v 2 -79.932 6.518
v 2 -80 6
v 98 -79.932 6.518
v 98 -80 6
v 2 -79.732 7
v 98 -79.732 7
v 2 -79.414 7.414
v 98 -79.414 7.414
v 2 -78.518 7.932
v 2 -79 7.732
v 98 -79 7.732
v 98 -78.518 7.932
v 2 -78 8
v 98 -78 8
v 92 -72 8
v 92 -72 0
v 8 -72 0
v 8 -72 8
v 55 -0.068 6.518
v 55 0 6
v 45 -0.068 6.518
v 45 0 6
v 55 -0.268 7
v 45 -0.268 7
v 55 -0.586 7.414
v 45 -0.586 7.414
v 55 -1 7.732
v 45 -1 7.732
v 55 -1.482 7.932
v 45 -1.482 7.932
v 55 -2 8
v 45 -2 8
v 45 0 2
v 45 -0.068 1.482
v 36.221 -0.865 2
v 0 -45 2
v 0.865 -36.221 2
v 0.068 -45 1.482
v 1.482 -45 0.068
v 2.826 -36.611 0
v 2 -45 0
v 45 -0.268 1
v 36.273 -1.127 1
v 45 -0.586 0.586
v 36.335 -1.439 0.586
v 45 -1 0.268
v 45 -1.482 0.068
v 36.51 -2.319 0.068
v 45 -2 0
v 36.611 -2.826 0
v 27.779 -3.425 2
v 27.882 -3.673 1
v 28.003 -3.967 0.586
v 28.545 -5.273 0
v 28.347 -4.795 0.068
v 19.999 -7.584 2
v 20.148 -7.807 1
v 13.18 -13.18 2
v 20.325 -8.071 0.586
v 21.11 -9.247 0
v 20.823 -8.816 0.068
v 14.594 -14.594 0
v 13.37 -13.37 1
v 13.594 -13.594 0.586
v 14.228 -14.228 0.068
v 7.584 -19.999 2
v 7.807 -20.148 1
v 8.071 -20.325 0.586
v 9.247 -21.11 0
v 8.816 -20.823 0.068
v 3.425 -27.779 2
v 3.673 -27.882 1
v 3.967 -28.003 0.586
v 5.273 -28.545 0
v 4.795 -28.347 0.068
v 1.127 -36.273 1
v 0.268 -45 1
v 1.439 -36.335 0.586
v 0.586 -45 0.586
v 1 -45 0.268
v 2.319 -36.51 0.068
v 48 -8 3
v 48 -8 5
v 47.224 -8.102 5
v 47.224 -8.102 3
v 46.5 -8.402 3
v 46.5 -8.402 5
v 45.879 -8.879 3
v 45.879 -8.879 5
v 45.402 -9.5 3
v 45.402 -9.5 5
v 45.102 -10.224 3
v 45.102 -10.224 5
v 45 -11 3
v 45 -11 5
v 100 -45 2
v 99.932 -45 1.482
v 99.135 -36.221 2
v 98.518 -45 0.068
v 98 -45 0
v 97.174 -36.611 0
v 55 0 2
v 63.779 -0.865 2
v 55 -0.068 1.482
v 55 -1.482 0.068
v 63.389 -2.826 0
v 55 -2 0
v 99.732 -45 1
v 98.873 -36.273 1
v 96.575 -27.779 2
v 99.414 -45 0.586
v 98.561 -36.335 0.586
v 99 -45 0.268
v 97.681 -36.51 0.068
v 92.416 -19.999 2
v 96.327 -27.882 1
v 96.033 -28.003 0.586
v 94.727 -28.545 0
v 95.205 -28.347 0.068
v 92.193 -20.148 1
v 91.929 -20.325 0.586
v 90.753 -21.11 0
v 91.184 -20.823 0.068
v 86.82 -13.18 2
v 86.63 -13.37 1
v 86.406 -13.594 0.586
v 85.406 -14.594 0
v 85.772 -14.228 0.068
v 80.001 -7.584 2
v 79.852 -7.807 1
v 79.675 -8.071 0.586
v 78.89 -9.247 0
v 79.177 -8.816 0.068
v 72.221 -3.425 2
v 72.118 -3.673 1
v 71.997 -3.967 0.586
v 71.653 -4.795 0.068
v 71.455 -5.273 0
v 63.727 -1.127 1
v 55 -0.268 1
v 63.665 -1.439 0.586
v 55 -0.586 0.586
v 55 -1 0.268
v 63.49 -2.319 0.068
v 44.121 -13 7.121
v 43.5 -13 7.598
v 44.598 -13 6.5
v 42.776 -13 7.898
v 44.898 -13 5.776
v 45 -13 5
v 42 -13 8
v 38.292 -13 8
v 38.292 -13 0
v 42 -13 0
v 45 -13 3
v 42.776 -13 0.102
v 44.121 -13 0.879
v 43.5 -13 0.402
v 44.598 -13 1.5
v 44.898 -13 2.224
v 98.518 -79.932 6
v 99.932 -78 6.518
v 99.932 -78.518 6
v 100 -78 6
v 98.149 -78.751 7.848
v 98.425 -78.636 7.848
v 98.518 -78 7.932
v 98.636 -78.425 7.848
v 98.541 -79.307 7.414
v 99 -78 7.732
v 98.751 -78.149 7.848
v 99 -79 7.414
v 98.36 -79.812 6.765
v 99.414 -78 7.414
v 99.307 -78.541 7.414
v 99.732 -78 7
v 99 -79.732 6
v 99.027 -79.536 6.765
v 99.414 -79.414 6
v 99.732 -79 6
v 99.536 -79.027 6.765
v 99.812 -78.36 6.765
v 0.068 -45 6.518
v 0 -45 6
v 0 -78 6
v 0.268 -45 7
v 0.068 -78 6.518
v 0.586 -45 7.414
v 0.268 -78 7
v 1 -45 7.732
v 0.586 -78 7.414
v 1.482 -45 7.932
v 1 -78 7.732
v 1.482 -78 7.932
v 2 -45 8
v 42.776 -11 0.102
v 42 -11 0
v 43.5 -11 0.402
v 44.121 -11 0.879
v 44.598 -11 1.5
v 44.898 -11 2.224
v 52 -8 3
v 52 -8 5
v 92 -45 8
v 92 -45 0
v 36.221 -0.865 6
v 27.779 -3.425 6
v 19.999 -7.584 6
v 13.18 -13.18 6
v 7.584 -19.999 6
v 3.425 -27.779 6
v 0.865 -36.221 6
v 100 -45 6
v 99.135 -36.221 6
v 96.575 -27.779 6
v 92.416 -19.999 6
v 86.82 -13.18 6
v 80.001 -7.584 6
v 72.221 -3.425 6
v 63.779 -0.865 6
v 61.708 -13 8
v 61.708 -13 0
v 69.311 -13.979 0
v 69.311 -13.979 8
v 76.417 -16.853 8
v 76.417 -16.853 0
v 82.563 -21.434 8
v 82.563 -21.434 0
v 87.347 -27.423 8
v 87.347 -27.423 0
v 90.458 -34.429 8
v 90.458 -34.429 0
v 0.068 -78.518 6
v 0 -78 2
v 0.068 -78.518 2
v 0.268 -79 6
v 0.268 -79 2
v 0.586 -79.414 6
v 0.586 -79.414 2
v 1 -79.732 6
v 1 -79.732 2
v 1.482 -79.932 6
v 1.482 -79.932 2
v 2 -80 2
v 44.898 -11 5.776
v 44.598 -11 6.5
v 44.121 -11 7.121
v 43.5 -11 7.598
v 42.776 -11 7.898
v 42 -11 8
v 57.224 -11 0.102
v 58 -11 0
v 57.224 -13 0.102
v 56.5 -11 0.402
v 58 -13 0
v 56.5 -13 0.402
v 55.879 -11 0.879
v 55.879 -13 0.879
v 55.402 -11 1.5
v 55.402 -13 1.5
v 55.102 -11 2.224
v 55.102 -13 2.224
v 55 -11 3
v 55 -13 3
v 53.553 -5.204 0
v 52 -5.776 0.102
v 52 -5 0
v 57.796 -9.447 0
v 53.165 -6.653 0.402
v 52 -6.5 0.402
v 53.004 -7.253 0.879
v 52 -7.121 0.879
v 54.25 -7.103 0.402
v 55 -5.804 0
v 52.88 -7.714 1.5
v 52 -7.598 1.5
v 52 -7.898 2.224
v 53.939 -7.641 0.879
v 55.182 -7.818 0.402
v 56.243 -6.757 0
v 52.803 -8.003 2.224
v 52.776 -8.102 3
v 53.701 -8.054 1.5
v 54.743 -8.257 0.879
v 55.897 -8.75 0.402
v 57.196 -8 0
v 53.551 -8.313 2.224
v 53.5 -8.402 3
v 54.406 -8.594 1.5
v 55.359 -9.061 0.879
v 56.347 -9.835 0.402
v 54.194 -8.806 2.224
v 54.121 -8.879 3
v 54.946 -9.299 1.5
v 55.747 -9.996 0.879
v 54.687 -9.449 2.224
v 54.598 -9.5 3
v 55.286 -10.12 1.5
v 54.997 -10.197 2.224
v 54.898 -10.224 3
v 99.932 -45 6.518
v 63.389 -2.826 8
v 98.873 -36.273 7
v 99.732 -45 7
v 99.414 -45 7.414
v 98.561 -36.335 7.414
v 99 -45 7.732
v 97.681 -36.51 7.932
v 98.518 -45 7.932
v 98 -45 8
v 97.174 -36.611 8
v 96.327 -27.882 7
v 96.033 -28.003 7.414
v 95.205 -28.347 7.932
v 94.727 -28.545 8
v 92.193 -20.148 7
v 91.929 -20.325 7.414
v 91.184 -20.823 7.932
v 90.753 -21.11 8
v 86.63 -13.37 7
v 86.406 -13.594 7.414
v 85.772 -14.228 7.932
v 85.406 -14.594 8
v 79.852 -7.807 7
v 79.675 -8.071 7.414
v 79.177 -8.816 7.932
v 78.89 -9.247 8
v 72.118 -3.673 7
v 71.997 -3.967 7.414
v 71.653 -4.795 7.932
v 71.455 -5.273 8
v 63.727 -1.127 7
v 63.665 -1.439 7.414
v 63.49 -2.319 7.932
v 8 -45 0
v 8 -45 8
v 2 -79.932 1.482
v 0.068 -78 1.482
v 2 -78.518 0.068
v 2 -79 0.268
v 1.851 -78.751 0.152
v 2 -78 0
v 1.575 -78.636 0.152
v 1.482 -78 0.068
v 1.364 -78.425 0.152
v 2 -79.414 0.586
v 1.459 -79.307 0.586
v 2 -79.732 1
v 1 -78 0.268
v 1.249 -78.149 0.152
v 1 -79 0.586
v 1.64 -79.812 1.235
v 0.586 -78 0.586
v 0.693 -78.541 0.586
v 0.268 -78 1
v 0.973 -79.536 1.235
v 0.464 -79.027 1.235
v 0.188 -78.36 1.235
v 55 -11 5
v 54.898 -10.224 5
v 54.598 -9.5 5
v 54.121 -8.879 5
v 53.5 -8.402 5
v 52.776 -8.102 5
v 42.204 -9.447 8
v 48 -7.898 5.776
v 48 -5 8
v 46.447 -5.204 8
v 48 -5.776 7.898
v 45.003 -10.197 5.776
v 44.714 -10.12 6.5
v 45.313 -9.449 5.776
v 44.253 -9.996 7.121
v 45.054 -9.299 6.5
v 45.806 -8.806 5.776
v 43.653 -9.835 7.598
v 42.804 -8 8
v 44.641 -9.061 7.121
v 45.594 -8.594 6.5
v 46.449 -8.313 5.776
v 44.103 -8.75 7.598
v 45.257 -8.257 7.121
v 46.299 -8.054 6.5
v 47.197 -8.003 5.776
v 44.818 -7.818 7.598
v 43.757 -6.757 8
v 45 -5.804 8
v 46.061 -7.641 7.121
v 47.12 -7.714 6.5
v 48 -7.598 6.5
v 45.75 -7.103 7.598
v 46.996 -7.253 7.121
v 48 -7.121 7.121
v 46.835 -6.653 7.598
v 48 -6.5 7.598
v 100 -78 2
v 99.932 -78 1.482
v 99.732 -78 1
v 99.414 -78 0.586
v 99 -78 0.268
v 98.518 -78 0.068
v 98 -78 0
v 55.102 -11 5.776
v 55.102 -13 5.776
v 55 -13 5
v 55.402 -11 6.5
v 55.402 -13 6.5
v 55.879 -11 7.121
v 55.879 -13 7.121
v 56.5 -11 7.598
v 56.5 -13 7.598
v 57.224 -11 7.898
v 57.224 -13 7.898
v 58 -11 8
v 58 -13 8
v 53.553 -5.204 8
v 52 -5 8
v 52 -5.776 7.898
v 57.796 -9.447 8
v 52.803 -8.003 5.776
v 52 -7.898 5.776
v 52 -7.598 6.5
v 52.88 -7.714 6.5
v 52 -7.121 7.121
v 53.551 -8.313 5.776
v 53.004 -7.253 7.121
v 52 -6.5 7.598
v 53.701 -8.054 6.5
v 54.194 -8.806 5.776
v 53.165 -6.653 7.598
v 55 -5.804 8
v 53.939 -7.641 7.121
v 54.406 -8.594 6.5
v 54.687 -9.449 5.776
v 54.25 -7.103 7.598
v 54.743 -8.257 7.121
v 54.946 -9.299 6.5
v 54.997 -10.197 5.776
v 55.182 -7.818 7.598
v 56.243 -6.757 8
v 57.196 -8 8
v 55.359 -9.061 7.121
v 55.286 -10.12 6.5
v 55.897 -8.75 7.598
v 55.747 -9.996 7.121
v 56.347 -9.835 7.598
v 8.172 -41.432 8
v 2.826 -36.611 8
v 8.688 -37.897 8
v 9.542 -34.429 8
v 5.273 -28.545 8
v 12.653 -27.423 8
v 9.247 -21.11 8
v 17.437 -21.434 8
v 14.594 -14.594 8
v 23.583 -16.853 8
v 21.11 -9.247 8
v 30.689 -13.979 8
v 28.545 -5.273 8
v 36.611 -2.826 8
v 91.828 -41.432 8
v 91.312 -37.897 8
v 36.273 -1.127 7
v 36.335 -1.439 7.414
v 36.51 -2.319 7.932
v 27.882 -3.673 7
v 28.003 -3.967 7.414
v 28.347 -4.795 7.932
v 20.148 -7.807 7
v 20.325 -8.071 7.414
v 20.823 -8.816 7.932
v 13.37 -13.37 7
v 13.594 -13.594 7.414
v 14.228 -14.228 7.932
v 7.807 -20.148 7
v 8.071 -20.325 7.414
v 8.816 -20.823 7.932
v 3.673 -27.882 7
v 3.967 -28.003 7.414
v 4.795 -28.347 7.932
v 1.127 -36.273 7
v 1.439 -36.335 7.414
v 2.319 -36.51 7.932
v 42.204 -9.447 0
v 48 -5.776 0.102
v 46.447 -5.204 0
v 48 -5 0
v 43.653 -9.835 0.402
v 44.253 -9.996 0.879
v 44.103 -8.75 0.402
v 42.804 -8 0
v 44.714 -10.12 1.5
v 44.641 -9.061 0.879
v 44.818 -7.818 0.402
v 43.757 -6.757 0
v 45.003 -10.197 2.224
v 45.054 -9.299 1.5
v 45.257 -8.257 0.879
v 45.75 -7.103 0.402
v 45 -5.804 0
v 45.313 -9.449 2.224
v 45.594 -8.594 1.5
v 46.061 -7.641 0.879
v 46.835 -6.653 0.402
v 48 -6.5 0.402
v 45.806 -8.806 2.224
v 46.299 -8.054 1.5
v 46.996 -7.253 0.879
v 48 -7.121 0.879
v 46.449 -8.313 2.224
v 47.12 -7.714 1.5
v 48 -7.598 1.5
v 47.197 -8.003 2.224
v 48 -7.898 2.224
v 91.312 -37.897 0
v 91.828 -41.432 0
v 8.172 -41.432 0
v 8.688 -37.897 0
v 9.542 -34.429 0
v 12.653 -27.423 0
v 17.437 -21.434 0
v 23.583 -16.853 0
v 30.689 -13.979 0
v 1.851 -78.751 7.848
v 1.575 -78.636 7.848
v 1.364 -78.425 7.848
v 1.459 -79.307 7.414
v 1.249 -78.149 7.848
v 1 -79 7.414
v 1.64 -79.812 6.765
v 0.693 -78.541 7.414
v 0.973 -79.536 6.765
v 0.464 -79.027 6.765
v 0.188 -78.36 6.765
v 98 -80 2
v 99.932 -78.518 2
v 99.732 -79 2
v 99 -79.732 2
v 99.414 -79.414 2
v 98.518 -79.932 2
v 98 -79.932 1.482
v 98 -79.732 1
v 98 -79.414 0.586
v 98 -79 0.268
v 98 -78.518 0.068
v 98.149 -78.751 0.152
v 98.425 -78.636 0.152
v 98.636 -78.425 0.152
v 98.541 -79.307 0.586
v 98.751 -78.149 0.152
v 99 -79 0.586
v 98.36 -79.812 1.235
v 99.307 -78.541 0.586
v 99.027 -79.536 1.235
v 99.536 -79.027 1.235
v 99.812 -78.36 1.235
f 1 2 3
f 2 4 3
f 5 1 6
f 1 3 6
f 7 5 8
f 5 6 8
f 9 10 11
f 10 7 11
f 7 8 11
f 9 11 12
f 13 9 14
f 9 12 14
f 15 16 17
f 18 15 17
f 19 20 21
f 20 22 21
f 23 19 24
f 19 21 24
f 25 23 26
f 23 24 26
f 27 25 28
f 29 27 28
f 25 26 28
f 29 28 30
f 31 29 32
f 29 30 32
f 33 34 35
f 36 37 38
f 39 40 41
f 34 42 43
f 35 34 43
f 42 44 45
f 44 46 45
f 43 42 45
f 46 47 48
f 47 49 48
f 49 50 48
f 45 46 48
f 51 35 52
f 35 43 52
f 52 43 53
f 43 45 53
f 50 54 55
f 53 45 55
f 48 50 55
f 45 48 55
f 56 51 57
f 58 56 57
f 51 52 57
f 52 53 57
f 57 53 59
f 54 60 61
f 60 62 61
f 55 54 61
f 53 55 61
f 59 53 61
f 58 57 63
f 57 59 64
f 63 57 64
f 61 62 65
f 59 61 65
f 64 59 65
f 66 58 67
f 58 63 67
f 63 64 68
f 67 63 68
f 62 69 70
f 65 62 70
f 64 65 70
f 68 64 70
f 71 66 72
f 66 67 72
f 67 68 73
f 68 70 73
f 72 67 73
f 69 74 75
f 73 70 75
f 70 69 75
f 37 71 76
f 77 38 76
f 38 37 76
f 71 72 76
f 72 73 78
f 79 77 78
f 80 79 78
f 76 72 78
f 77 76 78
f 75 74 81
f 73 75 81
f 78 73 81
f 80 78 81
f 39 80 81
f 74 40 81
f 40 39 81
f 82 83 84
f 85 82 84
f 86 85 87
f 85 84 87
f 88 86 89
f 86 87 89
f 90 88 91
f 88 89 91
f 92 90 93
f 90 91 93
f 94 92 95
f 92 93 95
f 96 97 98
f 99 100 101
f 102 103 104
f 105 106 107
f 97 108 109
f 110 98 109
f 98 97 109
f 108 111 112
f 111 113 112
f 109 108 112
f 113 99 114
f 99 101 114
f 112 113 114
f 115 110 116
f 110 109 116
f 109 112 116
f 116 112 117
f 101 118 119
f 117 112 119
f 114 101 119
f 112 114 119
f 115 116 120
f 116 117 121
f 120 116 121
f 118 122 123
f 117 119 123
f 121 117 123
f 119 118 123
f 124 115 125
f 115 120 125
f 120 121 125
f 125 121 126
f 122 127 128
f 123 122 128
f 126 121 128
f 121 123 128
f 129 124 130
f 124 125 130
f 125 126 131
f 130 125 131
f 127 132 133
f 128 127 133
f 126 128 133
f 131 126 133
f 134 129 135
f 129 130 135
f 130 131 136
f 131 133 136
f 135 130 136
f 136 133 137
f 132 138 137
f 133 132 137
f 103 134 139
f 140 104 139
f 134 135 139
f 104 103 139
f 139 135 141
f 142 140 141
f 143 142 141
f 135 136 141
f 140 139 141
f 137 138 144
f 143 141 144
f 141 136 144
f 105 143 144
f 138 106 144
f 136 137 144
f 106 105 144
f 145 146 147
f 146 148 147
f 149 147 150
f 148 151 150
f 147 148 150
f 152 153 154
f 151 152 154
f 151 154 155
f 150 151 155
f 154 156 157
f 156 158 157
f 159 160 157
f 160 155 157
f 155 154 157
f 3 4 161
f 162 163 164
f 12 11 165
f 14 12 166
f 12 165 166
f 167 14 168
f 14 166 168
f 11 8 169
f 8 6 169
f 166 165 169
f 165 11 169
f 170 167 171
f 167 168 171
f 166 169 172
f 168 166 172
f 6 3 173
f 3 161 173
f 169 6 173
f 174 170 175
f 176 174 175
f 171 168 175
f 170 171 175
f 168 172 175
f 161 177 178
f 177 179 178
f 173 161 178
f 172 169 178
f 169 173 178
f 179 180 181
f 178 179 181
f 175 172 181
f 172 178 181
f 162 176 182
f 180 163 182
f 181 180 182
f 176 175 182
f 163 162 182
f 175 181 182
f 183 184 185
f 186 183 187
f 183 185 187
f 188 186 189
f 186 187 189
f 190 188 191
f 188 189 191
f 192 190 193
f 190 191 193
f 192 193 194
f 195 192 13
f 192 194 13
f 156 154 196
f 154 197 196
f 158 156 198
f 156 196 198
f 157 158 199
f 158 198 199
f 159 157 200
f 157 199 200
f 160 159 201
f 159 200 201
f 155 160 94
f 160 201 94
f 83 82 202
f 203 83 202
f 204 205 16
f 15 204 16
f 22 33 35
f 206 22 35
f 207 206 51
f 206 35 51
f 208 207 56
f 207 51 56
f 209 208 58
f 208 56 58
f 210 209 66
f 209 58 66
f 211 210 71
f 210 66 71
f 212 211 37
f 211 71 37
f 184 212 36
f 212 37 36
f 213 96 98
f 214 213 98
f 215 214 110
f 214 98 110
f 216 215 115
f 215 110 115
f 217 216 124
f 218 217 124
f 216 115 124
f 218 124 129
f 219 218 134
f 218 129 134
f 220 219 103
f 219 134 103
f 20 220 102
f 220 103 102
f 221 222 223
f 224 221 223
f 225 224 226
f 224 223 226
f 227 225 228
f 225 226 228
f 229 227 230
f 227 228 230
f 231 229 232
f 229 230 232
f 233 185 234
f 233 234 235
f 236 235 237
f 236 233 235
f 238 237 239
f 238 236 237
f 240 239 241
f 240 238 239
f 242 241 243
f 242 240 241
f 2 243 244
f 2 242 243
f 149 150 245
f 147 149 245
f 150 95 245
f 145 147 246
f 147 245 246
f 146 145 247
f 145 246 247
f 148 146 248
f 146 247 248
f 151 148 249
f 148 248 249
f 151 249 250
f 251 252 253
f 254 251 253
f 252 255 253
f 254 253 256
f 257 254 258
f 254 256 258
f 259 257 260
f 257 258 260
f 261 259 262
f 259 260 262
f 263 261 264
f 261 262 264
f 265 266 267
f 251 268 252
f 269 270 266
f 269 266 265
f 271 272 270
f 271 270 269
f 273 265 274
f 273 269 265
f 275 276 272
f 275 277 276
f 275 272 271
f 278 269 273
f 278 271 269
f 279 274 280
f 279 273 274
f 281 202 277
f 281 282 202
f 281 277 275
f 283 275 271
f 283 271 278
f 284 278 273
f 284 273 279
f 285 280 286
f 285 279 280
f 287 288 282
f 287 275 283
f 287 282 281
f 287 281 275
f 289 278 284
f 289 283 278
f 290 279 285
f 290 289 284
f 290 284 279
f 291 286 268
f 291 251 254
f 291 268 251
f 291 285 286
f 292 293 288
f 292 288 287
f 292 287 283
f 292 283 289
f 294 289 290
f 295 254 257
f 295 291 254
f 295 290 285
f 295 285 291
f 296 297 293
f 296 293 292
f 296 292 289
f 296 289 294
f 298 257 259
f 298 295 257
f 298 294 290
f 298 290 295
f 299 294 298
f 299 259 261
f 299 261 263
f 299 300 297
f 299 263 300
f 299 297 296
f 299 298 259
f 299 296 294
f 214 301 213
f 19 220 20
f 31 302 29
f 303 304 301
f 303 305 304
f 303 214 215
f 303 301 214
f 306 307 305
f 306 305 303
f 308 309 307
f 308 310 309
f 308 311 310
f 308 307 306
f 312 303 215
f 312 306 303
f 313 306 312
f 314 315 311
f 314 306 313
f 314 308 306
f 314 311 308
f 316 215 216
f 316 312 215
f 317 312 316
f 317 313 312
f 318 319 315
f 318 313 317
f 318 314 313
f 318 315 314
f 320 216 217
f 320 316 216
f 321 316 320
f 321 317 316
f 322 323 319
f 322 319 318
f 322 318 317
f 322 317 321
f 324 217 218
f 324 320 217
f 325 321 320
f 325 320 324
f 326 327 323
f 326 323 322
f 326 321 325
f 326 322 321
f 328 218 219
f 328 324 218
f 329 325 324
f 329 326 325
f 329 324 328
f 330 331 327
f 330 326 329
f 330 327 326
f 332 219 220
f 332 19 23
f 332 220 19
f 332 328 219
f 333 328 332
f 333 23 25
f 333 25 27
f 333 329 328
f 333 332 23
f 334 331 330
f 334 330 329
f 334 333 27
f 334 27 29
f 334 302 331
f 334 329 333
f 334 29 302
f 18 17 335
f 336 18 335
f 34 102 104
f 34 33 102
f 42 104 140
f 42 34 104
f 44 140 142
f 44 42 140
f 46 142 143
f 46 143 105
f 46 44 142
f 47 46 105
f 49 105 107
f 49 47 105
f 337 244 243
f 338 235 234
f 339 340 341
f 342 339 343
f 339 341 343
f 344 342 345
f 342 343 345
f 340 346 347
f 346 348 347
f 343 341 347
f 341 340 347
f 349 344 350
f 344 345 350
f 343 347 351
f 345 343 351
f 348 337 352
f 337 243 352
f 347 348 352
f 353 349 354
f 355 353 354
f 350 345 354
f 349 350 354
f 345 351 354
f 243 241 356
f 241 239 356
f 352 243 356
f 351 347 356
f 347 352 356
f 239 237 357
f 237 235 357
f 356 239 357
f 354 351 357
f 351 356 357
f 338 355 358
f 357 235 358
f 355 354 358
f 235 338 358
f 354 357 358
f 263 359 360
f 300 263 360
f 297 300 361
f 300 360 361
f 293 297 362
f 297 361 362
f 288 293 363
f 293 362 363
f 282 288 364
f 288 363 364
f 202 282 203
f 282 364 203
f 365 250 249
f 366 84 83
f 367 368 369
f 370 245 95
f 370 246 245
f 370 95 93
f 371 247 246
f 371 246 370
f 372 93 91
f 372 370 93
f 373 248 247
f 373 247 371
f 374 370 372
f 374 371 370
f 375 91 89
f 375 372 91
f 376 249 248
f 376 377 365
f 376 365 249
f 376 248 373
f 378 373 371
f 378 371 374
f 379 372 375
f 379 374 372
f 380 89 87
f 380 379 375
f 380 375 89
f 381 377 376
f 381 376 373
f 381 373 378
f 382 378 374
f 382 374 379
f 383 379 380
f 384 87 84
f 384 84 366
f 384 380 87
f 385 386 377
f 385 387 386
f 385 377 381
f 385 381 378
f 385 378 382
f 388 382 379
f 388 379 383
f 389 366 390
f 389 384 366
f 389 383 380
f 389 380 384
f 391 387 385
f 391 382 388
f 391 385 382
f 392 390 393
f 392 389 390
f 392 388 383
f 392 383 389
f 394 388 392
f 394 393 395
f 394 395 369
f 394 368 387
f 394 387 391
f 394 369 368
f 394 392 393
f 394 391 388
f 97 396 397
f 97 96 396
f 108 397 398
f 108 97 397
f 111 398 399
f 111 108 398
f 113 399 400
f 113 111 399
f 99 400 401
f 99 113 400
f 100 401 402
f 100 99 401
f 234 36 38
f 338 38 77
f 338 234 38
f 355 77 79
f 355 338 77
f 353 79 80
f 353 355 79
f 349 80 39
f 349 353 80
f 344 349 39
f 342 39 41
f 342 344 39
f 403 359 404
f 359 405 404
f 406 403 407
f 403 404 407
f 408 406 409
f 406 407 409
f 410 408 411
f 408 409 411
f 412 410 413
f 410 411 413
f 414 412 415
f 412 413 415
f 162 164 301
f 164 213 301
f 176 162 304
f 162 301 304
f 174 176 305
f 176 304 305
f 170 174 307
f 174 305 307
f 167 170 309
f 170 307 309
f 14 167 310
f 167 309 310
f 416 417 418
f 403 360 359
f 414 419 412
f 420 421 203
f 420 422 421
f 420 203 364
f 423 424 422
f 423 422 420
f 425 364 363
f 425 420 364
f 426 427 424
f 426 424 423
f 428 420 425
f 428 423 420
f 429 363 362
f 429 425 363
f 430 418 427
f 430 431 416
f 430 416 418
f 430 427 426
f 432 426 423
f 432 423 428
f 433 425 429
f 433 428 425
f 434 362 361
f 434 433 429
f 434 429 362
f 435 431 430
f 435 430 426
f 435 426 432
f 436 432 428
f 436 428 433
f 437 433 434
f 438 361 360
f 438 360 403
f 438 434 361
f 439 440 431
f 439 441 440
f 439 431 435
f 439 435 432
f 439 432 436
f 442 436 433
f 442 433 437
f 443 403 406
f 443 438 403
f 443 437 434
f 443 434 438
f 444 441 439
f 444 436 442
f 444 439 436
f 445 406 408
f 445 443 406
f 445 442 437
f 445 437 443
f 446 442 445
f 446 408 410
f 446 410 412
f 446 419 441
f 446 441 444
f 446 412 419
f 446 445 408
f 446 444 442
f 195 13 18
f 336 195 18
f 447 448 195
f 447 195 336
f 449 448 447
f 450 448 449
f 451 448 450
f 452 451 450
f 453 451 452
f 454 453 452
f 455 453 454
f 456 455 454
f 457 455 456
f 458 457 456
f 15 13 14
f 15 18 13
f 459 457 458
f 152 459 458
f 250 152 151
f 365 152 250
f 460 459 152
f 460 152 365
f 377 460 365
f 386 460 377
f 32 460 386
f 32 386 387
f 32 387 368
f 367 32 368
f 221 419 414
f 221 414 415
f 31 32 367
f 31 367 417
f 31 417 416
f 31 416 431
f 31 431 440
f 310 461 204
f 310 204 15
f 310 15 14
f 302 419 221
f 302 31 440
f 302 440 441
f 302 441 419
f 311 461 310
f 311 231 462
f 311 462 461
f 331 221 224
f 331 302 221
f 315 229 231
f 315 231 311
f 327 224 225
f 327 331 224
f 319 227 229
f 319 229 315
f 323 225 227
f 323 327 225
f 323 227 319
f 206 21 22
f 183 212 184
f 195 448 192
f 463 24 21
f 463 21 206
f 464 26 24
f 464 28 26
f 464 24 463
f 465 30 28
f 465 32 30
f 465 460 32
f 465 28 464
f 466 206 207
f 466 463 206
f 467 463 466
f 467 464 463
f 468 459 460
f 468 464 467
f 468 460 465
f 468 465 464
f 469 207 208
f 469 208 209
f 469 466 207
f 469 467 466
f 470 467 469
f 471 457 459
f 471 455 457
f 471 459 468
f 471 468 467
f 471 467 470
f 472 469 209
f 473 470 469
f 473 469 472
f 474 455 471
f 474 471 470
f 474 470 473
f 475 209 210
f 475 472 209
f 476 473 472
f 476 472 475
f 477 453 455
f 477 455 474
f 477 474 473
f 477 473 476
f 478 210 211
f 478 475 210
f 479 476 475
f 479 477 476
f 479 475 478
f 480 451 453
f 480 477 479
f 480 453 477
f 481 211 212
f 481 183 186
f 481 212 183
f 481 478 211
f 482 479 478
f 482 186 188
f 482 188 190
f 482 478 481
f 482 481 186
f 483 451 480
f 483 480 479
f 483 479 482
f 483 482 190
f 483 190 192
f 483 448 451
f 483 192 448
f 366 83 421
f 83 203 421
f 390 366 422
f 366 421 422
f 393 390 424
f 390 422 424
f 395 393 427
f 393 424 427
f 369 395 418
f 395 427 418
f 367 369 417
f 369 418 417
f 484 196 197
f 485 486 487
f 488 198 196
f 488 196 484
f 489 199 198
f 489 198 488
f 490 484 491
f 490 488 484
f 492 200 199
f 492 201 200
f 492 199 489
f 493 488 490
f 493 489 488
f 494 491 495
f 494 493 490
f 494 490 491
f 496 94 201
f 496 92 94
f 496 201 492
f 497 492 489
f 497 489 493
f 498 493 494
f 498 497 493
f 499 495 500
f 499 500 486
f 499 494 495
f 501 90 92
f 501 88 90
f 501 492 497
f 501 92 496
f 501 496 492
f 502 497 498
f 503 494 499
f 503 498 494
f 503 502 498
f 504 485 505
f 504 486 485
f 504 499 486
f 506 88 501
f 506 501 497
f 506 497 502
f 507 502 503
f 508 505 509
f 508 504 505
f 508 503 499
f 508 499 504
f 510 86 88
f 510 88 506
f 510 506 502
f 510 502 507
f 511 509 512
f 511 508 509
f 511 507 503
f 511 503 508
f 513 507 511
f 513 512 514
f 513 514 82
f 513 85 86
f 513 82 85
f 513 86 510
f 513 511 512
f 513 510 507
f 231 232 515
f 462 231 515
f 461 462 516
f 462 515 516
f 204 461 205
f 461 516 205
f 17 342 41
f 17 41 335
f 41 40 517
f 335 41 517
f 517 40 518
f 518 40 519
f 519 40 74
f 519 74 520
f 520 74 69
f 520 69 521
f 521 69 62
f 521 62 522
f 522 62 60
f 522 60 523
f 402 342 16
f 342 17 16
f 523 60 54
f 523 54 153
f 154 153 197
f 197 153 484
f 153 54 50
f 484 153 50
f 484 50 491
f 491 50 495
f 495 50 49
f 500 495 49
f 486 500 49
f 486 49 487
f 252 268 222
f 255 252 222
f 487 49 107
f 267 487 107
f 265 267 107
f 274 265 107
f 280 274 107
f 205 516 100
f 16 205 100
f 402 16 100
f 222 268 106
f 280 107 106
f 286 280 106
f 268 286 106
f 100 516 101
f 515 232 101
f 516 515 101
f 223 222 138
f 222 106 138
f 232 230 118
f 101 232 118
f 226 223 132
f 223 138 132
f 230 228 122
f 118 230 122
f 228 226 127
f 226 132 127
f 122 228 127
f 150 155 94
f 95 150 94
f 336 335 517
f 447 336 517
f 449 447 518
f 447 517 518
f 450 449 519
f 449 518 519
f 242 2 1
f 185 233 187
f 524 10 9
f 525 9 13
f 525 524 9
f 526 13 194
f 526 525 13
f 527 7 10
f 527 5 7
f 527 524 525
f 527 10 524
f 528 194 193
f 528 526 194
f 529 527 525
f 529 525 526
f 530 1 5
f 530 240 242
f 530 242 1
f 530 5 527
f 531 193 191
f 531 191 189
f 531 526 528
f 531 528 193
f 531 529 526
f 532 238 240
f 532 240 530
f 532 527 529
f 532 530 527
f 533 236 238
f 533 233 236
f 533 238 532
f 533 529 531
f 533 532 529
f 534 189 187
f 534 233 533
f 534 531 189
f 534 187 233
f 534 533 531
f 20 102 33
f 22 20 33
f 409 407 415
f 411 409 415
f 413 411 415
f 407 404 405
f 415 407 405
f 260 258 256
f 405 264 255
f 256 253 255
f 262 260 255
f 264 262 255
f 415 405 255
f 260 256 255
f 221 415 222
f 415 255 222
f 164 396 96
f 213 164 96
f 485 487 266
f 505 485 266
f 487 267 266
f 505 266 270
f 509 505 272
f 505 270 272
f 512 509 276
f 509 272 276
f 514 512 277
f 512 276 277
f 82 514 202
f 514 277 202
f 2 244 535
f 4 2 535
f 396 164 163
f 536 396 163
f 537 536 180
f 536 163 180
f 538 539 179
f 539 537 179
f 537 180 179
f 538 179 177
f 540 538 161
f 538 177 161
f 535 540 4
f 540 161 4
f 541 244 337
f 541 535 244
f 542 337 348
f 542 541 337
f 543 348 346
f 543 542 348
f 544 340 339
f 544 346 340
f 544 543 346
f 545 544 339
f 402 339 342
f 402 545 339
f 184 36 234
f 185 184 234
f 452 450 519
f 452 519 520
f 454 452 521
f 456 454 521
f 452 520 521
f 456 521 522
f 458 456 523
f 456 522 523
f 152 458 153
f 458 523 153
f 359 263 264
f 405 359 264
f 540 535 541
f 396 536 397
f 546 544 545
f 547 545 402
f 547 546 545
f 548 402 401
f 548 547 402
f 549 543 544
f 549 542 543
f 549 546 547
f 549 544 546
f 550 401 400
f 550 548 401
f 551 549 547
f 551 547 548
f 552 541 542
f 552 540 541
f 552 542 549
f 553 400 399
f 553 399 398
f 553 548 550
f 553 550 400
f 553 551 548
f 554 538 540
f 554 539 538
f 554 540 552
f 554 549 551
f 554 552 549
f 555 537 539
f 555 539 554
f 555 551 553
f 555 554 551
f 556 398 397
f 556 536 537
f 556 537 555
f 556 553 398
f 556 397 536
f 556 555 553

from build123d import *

# Parameters (mm, degrees)
F1_DEPTH = 8
F2_R     = 2
F3_F1_R  = 3
F3_F2_R  = 3


with BuildPart() as f1:
    # F0 (on Top) → F1 (new body)
    with BuildSketch(Plane.XY):
        with BuildLine():
            Line((55, 0), (45, 0))
            ThreePointArc((45, 0), (13.1801948466, -13.1801948466), (0, -45))
            Line((0, -45), (0, -80))
            Line((0, -80), (100, -80))
            Line((100, -80), (100, -45))
            ThreePointArc((100, -45), (86.8198051534, -13.1801948466), (55, 0))
        make_face()
        with BuildLine():
            Line((45, -13), (45, -8))
            Line((45, -8), (55, -8))
            Line((55, -8), (55, -13))
            Line((55, -13), (61.7082039325, -13))
            ThreePointArc((61.7082039325, -13), (79.6366330725, -18.9464882279), (90.4576493575, -34.4285714286))
            ThreePointArc((90.4576493575, -34.4285714286), (91.6123819645, -39.6583254605), (92, -45))
            Line((92, -45), (92, -72))
            Line((92, -72), (8, -72))
            Line((8, -72), (8, -45))
            ThreePointArc((8, -45), (8.3876180355, -39.6583254605), (9.5423506425, -34.4285714286))
            ThreePointArc((9.5423506425, -34.4285714286), (20.3633669275, -18.9464882279), (38.2917960675, -13))
            Line((38.2917960675, -13), (45, -13))
        make_face(mode=Mode.SUBTRACT)
    extrude(amount=F1_DEPTH)

    # F2
    f2_edges = [f1.edges().sort_by_distance(p)[0] for p in [
        (0, -80, 4),
        (100, -80, 4),
        (50, -80, 8),
        (0, -62.5, 8),
        (50, -80, 0),
        (86.819805, -13.180195, 0),
    ]]
    fillet(f2_edges, radius=F2_R)

    # F3: fillet of radius 3 on 4 edges, made by hand

    # F3_f1
    f3_f1_edges = [f1.edges().sort_by_distance(p)[0] for p in [
        (45, -8, 4),
        (55, -8, 4),
    ]]
    fillet(f3_f1_edges, radius=F3_F1_R)

    # F3_f2
    f3_f2_edges = [f1.edges().sort_by_distance(p)[0] for p in [
        (50, -8, 0),
        (50, -8, 8),
        (45.8786796564, -8.8786796564, 8),
        (54.1213203436, -8.8786796564, 8),
        (45.8786796564, -8.8786796564, 0),
        (54.1213203436, -8.8786796564, 0),
    ]]
    fillet(f3_f2_edges, radius=F3_F2_R)


solid = f1.part
